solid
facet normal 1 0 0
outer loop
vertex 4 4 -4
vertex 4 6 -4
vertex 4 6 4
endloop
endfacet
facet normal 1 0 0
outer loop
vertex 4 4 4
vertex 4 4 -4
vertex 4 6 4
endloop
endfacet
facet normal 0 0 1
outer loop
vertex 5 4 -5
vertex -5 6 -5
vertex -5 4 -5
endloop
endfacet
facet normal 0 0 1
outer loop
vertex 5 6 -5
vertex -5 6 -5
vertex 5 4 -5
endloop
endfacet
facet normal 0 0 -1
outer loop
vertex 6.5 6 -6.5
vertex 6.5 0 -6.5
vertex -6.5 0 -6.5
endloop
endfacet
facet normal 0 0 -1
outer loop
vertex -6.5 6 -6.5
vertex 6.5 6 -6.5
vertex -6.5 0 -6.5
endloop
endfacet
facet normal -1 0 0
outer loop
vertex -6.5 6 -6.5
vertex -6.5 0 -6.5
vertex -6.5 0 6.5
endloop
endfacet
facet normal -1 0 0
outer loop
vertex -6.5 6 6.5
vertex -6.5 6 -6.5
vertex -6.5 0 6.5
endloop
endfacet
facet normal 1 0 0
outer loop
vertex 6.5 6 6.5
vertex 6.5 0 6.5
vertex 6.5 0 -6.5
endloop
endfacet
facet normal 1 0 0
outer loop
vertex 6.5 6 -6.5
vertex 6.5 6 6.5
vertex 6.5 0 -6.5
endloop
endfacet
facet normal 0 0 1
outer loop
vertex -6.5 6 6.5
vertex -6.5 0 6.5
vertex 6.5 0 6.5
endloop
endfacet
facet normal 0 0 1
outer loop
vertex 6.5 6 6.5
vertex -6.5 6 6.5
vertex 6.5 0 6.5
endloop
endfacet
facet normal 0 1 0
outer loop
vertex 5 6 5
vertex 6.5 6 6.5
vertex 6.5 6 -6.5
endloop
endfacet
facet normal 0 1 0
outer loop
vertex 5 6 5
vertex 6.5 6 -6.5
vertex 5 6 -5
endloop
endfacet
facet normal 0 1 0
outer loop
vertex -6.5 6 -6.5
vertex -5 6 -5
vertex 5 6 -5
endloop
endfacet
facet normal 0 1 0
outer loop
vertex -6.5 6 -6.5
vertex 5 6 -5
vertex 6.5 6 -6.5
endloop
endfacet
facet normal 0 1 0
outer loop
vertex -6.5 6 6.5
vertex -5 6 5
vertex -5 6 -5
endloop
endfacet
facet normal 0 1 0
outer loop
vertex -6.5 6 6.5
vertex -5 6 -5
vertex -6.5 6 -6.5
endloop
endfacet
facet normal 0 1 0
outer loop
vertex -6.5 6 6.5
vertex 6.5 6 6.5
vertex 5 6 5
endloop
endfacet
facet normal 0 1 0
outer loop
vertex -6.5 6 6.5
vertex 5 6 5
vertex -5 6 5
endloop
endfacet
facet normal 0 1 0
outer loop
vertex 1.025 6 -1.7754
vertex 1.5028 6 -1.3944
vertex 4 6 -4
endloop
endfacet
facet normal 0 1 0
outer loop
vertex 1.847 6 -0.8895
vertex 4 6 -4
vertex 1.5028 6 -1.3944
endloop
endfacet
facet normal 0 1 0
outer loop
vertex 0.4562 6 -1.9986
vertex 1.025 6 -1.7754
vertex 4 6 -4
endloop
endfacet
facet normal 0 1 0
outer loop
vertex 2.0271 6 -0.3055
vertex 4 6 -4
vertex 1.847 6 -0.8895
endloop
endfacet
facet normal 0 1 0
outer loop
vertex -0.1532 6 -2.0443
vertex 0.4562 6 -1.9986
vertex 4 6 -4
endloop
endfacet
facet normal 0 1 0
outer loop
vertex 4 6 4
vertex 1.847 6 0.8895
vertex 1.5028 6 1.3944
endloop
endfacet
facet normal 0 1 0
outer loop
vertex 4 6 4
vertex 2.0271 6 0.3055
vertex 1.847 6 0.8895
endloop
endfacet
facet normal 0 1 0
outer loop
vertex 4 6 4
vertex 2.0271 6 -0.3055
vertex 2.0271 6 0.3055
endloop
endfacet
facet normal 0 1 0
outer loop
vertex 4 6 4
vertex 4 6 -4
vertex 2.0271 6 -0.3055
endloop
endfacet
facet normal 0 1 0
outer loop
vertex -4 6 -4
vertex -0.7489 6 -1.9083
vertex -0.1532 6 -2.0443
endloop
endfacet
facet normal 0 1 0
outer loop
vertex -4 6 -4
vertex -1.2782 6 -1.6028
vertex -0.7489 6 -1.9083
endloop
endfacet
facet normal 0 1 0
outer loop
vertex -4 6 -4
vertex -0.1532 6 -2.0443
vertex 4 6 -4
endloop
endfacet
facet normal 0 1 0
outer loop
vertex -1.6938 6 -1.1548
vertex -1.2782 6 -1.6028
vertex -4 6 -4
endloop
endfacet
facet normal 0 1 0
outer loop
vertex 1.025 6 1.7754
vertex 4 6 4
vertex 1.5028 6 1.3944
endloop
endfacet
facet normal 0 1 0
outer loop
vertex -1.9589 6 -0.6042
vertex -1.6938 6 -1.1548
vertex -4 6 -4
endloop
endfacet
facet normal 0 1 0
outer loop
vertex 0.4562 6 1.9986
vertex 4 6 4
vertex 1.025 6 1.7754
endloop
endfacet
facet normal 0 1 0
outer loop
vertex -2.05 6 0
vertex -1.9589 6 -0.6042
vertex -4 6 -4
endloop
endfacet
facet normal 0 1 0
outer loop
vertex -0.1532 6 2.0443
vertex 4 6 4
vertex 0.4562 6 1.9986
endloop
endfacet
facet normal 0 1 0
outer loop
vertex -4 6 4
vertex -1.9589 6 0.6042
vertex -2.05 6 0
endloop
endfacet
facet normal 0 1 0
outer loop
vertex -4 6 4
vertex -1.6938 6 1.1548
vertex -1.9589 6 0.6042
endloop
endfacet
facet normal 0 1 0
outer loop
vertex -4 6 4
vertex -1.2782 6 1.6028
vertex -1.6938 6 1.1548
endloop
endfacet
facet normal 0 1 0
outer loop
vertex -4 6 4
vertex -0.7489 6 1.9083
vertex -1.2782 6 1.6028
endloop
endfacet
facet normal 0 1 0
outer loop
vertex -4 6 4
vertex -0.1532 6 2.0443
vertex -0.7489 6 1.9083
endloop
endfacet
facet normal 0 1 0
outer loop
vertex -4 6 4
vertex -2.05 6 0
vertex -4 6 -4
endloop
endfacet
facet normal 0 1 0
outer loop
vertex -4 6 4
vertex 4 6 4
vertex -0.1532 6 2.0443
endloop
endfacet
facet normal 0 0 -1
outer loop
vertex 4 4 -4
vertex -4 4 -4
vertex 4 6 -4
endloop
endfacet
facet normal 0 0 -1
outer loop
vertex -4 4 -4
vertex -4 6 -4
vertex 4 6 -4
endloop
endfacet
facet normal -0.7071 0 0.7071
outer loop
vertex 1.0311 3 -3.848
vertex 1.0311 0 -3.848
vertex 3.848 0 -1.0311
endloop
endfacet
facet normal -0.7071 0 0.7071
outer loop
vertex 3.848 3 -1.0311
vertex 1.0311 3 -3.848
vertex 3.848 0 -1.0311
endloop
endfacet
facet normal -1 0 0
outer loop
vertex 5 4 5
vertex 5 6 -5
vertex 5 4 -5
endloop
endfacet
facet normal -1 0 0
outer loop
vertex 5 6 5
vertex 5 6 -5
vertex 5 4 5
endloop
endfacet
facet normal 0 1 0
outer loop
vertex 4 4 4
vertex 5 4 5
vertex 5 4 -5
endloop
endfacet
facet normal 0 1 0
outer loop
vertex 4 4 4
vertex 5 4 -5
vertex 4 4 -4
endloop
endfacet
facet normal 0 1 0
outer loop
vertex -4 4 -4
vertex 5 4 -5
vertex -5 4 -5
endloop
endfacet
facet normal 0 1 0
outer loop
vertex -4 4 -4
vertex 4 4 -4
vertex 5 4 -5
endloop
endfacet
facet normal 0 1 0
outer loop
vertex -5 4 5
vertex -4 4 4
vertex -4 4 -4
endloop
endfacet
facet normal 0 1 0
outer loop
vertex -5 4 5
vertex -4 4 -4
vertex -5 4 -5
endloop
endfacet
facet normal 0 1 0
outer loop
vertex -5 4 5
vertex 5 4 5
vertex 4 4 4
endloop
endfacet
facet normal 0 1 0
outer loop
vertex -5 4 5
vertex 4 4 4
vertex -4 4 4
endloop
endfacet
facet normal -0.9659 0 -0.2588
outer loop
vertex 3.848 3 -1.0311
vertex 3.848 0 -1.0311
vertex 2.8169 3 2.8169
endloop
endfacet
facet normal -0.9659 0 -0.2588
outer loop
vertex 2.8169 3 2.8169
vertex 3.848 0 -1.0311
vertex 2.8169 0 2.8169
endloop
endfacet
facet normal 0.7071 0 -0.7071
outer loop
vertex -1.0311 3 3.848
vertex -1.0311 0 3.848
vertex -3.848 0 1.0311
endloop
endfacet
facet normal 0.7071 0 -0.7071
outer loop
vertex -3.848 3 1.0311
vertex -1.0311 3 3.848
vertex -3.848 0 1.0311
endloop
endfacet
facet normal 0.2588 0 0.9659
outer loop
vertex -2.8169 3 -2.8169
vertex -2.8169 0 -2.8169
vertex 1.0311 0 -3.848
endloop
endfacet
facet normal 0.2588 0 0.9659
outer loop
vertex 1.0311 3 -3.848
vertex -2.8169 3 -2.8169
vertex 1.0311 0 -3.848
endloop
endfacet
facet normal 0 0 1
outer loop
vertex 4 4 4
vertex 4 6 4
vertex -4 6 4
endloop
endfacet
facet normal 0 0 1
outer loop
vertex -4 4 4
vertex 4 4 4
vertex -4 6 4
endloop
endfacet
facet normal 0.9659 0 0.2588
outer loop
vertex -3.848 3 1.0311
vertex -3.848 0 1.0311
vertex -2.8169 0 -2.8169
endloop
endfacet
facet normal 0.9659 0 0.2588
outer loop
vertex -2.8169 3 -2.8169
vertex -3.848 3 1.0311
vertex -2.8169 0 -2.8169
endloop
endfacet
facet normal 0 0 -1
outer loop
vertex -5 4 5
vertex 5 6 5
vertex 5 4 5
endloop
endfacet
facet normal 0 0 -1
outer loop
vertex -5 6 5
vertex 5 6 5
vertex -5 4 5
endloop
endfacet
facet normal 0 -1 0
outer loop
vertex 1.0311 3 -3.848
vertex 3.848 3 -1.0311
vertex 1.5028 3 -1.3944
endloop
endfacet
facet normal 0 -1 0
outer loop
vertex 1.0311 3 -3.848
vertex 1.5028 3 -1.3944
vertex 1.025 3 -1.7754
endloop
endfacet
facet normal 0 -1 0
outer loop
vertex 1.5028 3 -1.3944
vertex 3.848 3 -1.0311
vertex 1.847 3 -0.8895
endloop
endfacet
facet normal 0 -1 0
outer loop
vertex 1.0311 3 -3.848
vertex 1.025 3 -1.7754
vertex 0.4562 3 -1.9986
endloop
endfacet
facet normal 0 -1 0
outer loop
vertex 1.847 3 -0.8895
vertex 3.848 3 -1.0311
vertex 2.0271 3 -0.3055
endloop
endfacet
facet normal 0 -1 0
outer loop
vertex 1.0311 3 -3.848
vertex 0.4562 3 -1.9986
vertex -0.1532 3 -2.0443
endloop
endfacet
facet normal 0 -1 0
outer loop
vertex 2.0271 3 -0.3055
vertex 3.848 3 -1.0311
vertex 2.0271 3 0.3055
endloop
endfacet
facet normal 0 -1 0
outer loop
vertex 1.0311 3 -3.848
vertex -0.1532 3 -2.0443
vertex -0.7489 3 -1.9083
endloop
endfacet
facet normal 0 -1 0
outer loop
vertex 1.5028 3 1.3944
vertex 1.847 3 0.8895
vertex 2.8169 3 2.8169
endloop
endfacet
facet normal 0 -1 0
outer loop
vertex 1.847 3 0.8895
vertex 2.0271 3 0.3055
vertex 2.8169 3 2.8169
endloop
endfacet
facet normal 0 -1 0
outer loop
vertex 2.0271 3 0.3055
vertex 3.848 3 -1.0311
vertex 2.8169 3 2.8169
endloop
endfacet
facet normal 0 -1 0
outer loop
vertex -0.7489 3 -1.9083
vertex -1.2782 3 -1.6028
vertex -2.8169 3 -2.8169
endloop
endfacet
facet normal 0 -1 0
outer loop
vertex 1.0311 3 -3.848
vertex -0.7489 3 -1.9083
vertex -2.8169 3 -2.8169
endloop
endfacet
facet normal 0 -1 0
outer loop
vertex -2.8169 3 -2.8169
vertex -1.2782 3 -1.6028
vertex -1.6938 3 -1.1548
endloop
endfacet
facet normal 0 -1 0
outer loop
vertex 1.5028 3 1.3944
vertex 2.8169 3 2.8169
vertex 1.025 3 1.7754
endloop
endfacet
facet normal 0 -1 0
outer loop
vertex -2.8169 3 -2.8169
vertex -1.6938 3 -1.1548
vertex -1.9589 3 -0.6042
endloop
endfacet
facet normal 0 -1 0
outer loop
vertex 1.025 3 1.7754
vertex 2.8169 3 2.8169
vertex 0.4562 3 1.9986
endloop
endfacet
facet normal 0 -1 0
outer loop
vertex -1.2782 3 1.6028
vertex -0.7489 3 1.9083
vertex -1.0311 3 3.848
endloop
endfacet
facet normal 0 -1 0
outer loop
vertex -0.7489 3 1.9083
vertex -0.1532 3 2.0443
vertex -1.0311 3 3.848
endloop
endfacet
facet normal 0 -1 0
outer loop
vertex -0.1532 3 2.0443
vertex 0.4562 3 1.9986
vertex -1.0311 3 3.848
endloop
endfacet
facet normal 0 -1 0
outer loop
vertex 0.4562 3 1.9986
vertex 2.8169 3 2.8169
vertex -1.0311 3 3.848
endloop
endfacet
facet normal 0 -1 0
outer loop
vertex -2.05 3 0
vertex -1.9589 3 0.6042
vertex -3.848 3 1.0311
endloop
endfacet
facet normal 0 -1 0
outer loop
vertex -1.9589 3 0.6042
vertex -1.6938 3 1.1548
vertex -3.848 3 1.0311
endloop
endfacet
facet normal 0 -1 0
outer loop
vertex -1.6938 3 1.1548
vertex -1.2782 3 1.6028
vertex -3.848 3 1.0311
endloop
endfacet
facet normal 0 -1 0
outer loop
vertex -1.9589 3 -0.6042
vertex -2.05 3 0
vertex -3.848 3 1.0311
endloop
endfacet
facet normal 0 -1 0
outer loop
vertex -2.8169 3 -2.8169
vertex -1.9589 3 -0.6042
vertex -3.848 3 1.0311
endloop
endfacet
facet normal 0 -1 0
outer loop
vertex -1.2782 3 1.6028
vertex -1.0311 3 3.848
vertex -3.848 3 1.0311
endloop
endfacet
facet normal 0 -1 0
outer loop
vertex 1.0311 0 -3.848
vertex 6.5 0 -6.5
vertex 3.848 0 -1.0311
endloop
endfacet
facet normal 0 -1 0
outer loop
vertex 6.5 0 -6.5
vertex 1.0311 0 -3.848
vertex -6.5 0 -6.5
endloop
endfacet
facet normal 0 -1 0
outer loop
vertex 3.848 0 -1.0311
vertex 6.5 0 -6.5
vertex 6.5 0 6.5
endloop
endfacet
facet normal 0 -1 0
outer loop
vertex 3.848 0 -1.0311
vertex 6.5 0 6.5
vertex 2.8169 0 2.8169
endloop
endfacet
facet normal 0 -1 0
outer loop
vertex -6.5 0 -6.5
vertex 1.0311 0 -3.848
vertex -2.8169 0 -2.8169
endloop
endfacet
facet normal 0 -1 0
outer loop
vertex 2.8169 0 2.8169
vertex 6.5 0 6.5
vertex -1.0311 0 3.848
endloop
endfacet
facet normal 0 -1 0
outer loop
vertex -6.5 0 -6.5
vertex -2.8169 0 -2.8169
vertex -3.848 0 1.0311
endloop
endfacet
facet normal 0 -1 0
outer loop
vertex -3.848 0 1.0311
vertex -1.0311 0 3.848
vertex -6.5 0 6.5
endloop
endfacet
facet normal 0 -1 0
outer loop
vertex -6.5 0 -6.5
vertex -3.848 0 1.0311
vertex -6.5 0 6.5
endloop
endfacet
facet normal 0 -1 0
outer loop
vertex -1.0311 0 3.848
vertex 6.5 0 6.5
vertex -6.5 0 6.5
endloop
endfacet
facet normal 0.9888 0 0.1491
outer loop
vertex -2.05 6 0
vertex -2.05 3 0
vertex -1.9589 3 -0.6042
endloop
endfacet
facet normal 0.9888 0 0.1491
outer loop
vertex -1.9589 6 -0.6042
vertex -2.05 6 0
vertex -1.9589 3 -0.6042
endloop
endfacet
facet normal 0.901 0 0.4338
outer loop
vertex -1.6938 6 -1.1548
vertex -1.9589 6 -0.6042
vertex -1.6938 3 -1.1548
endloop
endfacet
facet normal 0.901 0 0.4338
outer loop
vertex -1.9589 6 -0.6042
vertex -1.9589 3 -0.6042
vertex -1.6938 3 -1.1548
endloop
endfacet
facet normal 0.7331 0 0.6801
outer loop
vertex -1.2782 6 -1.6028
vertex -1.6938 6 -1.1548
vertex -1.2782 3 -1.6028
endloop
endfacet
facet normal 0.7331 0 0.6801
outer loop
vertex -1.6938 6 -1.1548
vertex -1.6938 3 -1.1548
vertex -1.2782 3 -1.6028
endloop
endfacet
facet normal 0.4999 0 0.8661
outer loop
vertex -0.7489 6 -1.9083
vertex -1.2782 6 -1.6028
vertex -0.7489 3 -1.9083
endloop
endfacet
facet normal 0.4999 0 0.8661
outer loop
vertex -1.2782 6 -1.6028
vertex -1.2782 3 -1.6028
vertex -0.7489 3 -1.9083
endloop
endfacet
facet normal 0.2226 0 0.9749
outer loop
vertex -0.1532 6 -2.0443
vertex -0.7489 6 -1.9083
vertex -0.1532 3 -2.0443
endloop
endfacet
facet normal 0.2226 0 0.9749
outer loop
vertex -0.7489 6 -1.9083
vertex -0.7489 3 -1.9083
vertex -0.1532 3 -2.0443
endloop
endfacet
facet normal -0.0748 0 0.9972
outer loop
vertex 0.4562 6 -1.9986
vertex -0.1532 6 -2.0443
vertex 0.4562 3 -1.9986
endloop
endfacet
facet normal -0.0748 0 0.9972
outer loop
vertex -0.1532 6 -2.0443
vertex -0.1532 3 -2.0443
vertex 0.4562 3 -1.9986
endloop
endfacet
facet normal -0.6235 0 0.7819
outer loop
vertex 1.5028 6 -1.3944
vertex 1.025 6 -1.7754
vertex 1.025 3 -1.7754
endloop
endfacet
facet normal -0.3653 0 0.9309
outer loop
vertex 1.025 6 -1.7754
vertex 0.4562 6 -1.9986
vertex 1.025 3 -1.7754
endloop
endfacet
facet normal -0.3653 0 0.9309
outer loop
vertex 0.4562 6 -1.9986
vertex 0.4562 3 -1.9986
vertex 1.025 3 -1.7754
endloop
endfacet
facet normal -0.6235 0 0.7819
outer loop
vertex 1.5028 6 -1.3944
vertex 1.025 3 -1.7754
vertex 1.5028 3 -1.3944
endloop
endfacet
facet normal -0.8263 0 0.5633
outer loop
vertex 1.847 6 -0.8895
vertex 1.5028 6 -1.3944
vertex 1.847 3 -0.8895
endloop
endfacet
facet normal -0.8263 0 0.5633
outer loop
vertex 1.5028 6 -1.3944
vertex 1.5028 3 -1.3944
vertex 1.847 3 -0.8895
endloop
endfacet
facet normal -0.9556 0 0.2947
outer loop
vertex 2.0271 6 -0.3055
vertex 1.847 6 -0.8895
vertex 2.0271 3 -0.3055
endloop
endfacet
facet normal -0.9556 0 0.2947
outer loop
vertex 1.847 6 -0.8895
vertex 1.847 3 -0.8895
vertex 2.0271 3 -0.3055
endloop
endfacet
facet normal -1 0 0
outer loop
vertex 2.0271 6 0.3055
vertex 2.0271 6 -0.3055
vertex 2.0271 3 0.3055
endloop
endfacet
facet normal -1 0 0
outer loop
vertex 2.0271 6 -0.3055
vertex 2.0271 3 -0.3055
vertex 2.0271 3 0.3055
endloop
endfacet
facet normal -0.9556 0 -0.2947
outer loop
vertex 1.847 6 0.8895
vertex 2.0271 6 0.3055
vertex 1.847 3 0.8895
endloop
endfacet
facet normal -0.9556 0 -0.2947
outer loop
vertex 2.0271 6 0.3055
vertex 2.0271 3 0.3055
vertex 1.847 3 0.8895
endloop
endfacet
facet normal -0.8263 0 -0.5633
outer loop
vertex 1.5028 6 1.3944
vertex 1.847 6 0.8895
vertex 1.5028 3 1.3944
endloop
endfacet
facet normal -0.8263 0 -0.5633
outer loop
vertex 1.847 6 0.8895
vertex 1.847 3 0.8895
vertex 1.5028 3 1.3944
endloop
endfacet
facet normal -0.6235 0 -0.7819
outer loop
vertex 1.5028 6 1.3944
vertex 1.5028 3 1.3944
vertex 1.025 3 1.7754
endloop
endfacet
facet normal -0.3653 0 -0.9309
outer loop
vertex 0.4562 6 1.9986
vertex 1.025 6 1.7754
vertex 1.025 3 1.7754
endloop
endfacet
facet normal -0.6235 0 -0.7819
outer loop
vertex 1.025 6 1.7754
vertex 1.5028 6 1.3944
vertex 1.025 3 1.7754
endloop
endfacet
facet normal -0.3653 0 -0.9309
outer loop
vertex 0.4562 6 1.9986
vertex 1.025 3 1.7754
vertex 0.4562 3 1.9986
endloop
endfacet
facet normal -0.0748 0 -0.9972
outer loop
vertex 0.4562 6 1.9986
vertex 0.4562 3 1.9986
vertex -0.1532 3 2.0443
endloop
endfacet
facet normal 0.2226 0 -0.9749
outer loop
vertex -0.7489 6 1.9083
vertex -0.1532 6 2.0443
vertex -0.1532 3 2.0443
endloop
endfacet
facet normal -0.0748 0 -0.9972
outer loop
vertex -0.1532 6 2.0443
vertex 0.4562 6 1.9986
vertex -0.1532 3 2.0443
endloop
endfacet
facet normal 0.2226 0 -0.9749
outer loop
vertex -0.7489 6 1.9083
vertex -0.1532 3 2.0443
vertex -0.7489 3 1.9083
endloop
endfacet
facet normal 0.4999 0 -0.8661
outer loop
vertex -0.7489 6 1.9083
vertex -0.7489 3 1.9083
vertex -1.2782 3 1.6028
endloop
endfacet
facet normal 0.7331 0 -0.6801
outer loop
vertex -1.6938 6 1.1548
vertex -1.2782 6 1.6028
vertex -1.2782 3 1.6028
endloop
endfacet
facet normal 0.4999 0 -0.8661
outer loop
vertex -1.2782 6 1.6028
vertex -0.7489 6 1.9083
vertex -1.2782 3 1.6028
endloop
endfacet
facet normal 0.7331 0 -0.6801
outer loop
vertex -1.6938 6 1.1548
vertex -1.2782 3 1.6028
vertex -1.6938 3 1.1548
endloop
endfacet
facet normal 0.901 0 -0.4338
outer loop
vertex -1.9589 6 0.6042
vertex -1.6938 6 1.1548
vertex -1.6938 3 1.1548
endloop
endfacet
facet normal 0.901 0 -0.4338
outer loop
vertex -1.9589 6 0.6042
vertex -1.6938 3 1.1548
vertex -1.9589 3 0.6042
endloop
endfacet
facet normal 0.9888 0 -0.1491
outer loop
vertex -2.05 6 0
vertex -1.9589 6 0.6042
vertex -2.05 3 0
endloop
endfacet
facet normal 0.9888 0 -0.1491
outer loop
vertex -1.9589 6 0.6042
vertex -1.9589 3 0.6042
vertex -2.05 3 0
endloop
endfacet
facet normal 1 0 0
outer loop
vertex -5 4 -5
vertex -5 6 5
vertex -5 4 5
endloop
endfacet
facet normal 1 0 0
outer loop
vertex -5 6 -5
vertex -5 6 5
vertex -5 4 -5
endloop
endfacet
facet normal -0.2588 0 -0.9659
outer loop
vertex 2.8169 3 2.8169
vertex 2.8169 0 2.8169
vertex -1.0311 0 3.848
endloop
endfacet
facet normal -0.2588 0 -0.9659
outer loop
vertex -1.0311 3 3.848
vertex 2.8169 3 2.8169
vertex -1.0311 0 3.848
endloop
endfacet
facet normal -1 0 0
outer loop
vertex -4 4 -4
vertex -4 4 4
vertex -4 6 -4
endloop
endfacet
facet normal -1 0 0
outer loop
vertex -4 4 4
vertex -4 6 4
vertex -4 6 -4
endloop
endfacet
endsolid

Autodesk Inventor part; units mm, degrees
ref_plane "YZ Plane" through (0, 0, 0) normal (1, 0, 0) x (0, 1, 0)
ref_plane "XY Plane" through (0, 0, 0) normal (0, 0, 1) x (1, 0, 0)
ref_plane "作業平面2" through (0, 6, 0) normal (0, 1, 0) x (-1, 0, 0)
sketch "スケッチ3" plane through (0, 6, 0) normal (0, 1, 0) x (-1, 0, 0)
  line L0 (4, -4) -> (-4, -4)
  line L1 (-4, -4) -> (-4, 4)
  line L2 (-4, 4) -> (4, 4)
  line L3 (4, 4) -> (4, -4)
  line L4 (4, -4) -> (-4, 4) construction
  line L5 (-4, -4) -> (4, 4) construction
  line L6 (5, -5) -> (-5, -5)
  line L7 (-5, -5) -> (-5, 5)
  line L8 (-5, 5) -> (5, 5)
  line L9 (5, 5) -> (5, -5)
  line L10 (5, -5) -> (-5, 5) construction
  line L11 (-5, -5) -> (5, 5) construction
  point P0 (0, 0)
  point P1 (0, 0)
  dimension "d19" = 8
  dimension "d20" = 8
  dimension "d21" = 10
  dimension "d22" = 10
sketch "スケッチ1" plane through (0, 0, 0) normal (0, 1, 0) x (-1, 0, 0)
  line L0 (6.5, -6.5) -> (-6.5, 6.5) construction
  line L1 (-6.5, -6.5) -> (6.5, 6.5) construction
  line L2 (1.0311, 3.848) -> (3.848, 1.0311)
  line L3 (3.848, 1.0311) -> (2.8169, -2.8169)
  line L4 (2.8169, -2.8169) -> (-1.0311, -3.848)
  line L5 (-1.0311, -3.848) -> (-3.848, -1.0311)
  line L6 (-3.848, -1.0311) -> (-2.8169, 2.8169)
  line L7 (-2.8169, 2.8169) -> (1.0311, 3.848)
  line L8 (-6.5, -6.5) -> (6.5, -6.5)
  line L9 (6.5, -6.5) -> (6.5, 6.5)
  line L10 (6.5, 6.5) -> (-6.5, 6.5)
  line L11 (-6.5, 6.5) -> (-6.5, -6.5)
  line L12 (-6.5, -6.5) -> (6.5, 6.5) construction
  line L13 (6.5, -6.5) -> (-6.5, 6.5) construction
  circle A0 centre (0, 0) radius 2.05
  dimension "d33" = 6.9
  dimension "d34" = 13
  dimension "d35" = 13
  dimension "d36" = 4.1
extrude "押し出し8" add sketch "スケッチ1" along normal blind 6 contours L2 L3 L4 L5 L6 L7 | L11 L10 L9 L8 | A0
extrude "押し出し9" cut sketch "スケッチ3" against normal blind 2
extrude "押し出し10" cut sketch "スケッチ1" along normal blind 3 contours L2 L3 L4 L5 L6 L7
extrude "押し出し11" cut sketch "スケッチ1" along normal blind 6 contours A0
properties part number "pin_joint_ver1"
